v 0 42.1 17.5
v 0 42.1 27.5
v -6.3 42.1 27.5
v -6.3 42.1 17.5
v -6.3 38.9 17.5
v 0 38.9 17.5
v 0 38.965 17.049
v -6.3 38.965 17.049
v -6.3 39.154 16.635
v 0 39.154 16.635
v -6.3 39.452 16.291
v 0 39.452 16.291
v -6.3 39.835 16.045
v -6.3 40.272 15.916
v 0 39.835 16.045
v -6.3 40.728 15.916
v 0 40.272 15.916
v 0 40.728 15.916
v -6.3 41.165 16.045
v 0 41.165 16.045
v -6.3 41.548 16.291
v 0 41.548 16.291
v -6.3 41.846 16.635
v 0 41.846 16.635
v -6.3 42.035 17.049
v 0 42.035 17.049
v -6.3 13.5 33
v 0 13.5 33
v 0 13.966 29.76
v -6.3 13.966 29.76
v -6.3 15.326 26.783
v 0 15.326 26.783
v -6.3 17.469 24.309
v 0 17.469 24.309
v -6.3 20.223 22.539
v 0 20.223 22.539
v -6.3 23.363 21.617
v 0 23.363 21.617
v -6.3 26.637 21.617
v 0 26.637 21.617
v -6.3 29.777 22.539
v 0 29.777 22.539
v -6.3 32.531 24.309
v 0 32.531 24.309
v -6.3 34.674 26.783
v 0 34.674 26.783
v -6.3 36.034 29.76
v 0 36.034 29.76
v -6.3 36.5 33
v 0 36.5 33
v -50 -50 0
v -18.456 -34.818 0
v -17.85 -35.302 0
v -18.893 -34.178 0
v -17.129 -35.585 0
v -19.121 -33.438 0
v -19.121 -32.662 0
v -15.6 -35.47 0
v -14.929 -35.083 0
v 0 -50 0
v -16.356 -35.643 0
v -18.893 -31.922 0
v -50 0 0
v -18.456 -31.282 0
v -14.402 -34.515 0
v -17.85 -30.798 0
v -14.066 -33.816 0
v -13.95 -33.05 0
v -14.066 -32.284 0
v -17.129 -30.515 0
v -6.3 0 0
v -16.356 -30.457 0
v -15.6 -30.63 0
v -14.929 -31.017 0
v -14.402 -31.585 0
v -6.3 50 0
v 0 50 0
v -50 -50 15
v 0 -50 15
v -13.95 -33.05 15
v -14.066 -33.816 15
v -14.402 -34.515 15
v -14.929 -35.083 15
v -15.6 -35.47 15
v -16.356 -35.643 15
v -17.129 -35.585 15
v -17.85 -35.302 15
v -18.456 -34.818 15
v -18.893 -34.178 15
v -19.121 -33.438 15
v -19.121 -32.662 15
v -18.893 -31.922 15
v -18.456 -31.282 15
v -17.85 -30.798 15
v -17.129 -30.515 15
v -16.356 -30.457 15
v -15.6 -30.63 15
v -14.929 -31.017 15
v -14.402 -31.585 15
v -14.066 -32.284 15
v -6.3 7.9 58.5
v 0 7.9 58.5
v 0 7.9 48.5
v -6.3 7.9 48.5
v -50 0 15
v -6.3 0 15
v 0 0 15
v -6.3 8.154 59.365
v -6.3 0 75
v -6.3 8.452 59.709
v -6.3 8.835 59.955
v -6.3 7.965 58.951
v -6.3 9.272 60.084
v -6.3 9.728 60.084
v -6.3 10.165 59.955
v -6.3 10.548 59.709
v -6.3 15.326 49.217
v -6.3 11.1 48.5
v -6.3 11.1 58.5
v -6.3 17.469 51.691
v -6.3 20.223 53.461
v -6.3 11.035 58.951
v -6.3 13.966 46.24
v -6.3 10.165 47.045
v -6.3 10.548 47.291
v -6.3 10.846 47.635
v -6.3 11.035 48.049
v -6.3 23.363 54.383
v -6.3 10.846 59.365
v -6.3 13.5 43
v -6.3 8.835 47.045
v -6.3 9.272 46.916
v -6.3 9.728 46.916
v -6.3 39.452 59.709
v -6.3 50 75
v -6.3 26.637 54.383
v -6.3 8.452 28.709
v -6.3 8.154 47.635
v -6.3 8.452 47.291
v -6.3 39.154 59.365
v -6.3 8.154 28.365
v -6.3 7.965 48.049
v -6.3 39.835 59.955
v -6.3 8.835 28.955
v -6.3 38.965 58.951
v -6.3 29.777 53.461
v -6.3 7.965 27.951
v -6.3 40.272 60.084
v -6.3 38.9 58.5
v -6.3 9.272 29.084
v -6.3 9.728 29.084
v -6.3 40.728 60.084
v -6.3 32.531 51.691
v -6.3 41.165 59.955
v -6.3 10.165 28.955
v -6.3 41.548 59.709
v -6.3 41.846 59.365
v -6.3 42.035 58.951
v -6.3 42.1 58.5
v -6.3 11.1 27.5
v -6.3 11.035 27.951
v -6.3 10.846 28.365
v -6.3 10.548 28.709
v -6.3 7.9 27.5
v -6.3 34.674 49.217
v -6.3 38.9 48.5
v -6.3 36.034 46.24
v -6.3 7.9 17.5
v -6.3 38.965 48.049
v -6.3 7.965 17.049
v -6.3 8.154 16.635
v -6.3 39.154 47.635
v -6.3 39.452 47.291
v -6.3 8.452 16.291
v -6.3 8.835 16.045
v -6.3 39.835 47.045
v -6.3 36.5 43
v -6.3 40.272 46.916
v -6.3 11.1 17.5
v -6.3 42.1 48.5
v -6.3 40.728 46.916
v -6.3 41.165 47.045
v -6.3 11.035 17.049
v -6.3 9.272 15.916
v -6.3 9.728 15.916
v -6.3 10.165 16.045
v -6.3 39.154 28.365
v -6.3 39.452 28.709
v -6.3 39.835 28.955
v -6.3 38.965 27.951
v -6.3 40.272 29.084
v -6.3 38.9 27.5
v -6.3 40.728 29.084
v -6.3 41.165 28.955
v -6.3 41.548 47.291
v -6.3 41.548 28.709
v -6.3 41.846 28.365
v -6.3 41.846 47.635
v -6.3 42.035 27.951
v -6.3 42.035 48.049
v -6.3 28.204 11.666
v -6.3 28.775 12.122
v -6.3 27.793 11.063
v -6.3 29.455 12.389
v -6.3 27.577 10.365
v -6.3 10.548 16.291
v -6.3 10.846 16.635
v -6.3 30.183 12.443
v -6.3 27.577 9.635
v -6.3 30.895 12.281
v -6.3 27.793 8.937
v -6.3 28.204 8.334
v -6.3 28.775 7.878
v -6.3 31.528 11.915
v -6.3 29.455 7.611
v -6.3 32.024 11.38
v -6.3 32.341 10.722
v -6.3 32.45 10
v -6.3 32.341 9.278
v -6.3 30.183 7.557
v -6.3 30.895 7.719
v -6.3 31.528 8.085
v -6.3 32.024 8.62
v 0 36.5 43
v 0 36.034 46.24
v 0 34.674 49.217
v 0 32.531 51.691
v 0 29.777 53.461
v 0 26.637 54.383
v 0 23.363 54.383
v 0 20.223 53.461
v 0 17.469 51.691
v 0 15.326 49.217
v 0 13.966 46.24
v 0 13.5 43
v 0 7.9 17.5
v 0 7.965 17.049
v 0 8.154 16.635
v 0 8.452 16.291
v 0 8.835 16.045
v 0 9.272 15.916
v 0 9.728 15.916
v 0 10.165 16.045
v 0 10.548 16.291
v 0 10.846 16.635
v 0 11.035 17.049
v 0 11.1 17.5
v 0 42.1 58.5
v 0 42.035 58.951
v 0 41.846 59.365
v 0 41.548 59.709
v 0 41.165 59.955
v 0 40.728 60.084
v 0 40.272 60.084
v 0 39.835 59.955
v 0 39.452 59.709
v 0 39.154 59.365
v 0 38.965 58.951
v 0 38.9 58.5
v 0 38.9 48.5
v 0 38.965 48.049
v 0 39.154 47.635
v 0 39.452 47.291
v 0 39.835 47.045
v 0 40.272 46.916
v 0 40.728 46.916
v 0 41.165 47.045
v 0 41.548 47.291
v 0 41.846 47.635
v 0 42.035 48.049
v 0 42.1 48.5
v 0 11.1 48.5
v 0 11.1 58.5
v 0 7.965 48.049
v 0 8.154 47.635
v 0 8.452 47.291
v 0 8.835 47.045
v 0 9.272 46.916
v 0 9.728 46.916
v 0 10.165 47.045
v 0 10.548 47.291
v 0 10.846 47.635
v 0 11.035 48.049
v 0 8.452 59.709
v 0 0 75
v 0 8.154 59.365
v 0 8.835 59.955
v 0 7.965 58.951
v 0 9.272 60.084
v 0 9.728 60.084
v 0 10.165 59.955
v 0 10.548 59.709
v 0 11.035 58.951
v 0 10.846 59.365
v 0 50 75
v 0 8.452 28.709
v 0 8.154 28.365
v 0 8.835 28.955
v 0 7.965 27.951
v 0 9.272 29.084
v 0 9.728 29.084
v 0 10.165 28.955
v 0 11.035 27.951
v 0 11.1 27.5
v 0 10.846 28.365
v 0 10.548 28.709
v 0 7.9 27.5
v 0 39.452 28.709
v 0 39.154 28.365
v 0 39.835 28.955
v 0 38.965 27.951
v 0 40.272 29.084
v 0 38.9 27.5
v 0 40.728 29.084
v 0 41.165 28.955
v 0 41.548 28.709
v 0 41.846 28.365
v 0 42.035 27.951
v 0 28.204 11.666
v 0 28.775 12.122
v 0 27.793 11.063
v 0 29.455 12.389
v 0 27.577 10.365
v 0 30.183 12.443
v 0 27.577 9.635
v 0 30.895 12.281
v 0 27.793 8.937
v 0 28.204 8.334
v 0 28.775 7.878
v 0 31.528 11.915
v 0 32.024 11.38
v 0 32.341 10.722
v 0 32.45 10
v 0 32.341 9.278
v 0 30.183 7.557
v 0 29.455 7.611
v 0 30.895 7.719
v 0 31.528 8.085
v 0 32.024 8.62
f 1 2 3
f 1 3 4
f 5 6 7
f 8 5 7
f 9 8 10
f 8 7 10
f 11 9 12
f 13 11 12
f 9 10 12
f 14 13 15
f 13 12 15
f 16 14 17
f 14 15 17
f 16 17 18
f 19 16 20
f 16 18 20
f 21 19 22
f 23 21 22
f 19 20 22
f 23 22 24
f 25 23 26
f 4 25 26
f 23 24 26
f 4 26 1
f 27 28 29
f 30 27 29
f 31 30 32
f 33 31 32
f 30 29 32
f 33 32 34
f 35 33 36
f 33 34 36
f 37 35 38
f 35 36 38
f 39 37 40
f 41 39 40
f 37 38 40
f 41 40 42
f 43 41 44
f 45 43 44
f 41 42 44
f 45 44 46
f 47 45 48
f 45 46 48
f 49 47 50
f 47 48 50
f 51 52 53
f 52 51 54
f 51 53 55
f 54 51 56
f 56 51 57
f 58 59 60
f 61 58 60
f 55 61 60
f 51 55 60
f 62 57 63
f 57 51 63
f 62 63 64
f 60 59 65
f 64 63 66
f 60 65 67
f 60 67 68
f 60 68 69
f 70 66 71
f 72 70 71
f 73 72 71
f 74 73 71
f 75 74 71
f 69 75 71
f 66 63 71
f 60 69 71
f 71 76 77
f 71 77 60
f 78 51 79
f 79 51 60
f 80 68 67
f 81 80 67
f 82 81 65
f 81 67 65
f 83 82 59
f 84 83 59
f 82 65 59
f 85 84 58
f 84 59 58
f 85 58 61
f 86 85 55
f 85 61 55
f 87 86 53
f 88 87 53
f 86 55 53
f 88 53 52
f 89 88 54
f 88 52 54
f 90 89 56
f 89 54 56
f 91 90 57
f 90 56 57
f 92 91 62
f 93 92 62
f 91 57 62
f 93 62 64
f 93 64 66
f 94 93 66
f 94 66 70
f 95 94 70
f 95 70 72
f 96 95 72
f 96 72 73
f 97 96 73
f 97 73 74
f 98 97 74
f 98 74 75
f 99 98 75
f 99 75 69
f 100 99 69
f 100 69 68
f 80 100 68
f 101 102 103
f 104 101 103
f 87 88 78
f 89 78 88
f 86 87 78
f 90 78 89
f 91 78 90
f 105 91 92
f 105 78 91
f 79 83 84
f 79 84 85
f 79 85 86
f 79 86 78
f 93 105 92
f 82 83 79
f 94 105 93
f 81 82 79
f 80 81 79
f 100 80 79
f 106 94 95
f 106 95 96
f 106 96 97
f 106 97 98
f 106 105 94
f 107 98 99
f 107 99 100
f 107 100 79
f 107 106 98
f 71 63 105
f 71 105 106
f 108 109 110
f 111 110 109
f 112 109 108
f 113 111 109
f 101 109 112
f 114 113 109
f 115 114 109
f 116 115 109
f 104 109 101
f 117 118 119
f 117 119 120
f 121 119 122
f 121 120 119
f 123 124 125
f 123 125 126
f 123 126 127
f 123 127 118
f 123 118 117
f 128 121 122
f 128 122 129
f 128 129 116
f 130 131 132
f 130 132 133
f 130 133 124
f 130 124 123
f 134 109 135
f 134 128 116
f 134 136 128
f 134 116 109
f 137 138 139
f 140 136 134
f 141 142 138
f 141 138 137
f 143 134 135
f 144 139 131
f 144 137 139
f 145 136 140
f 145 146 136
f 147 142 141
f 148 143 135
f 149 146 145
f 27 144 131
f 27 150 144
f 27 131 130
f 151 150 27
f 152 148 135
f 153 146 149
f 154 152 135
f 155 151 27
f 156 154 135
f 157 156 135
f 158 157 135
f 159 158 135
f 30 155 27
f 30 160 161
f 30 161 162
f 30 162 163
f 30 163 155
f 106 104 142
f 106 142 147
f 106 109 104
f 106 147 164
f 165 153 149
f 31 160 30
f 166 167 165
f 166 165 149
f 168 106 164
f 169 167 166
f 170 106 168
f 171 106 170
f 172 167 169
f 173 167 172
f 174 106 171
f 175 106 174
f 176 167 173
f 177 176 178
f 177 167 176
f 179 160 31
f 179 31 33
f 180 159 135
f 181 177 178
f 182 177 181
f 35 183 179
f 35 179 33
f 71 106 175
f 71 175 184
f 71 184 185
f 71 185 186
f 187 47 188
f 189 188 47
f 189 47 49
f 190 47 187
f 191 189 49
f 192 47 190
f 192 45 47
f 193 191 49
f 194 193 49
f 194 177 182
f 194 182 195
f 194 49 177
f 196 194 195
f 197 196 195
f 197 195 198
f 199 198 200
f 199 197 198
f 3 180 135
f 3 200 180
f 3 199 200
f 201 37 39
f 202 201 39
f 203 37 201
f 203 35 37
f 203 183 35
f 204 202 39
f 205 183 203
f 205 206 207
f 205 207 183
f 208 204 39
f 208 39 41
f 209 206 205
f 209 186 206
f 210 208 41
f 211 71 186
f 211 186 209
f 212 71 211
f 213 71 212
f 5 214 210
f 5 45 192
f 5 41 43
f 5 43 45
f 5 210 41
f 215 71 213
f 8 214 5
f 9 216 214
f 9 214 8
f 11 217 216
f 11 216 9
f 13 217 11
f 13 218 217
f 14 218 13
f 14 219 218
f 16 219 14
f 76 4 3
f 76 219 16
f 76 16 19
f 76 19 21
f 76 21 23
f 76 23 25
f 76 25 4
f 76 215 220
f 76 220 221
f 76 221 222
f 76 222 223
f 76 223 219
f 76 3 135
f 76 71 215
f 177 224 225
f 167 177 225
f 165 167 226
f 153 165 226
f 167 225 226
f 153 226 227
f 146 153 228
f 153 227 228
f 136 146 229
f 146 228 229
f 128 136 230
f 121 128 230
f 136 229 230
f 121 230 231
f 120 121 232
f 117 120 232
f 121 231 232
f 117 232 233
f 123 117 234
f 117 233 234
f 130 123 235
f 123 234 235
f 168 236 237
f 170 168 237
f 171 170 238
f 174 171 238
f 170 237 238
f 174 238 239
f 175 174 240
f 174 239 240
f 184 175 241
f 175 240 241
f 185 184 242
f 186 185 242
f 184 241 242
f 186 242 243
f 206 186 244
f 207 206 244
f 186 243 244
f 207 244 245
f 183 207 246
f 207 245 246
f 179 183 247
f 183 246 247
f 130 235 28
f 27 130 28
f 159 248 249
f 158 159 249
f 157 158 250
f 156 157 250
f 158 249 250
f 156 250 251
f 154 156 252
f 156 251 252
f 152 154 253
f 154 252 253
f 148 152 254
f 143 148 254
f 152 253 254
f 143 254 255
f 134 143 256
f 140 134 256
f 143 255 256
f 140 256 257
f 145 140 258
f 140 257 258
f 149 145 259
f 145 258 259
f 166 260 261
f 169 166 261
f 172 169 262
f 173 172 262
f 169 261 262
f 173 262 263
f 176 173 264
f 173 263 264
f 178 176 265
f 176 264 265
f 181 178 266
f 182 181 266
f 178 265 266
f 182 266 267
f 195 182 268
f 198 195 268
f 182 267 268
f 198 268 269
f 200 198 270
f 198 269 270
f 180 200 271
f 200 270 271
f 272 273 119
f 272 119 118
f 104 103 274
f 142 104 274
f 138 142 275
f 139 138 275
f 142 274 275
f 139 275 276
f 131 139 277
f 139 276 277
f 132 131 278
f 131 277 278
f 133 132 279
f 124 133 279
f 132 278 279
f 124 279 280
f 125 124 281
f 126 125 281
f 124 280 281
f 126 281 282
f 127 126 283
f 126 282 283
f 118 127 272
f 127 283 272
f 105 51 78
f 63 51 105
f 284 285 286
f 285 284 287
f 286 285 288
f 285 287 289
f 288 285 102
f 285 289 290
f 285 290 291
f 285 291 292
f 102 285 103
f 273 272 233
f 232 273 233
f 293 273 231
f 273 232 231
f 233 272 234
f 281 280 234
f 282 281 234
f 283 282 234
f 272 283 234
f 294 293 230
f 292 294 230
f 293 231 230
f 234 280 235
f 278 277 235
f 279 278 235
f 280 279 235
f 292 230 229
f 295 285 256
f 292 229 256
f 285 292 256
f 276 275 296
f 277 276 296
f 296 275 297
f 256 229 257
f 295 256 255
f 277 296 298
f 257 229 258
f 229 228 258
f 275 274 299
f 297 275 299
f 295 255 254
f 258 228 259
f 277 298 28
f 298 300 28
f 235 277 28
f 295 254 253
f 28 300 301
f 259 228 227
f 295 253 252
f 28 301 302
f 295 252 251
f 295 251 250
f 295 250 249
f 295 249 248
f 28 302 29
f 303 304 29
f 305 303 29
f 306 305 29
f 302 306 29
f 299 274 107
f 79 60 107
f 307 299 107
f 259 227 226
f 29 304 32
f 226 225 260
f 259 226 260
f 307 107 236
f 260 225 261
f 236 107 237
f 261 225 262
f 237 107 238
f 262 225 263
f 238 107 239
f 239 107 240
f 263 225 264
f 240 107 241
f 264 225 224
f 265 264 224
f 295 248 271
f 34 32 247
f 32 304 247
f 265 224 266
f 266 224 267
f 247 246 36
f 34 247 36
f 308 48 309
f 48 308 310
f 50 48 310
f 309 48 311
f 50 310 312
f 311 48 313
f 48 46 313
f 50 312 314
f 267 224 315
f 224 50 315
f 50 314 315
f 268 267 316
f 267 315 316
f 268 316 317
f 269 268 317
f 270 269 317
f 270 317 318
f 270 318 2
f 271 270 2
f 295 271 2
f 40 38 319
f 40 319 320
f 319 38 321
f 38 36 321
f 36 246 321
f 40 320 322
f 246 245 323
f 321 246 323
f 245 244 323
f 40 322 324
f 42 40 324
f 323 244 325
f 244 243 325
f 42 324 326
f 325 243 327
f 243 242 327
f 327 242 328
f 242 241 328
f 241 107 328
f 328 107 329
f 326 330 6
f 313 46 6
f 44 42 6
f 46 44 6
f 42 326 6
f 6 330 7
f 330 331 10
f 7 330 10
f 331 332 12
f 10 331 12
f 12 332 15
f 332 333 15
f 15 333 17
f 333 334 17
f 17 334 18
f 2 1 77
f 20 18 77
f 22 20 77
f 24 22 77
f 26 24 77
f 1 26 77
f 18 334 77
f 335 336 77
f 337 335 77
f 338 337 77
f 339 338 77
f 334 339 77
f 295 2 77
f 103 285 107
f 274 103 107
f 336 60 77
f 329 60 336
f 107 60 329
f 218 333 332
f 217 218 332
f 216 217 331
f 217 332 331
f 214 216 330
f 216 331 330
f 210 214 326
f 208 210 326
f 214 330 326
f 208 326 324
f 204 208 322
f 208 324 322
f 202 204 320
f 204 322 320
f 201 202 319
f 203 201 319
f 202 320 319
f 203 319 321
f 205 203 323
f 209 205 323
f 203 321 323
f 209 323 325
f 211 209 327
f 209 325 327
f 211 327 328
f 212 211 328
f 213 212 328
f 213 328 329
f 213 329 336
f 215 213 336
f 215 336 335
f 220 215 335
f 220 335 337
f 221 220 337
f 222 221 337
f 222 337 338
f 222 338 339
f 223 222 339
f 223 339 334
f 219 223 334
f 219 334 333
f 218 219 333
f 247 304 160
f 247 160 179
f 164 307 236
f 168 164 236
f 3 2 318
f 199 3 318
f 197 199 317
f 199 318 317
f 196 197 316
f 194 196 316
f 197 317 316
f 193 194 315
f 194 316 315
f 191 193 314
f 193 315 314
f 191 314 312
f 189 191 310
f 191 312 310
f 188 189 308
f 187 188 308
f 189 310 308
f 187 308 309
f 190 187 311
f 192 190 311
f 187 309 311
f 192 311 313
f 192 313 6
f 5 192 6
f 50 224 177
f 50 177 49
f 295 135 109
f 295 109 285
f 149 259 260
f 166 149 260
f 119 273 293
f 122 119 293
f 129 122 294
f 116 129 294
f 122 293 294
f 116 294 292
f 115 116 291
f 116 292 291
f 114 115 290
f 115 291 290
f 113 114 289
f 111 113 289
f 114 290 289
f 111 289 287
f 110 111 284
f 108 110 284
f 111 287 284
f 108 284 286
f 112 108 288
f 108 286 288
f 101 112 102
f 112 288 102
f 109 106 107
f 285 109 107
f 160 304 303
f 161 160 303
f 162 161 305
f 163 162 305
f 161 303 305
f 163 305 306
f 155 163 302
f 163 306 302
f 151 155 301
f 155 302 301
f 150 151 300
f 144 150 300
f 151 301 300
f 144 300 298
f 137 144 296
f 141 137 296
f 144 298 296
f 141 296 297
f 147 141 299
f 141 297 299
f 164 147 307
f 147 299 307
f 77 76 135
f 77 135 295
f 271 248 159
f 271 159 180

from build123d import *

# Parameters (mm, degrees)
SKETCH_W        = 50
SKETCH_H        = 50
PAD_DEPTH       = 15
SKETCH001_W     = 6.3
SKETCH001_H     = 50
PAD001_DEPTH    = 75
SKETCH002_R     = 2.45
POCKET_DEPTH    = 13
SKETCH004_R     = 2.6
POCKET001_DEPTH = 85.001


with BuildPart() as part:
    # Sketch → Pad (new body)
    with BuildSketch(Plane.XY):
        with Locations((-25, -25)):
            Rectangle(SKETCH_W, SKETCH_H)
    extrude(amount=PAD_DEPTH)

    # Sketch001 → Pad001 (join)
    with BuildSketch(Plane.XY):
        with Locations((-3.15, 25)):
            Rectangle(SKETCH001_W, SKETCH001_H)
    extrude(amount=PAD001_DEPTH)

    # Sketch002 (on Face12 of Pad001) → Pocket (cut)
    with BuildSketch(Plane.YZ):
        with Locations((30, 10)):
            Circle(SKETCH002_R)
        with BuildLine():
            ThreePointArc((42.1, 58.5), (40.5, 60.1), (38.9, 58.5))
            Line((38.9, 58.5), (38.9, 48.5))
            ThreePointArc((38.9, 48.5), (40.5, 46.9), (42.1, 48.5))
            Line((42.1, 58.5), (42.1, 48.5))
        make_face()
        with BuildLine():
            ThreePointArc((42.1, 27.5), (40.5, 29.1), (38.9, 27.5))
            Line((38.9, 27.5), (38.9, 17.5))
            ThreePointArc((38.9, 17.5), (40.5, 15.9), (42.1, 17.5))
            Line((42.1, 27.5), (42.1, 17.5))
        make_face()
        with BuildLine():
            ThreePointArc((11.1, 58.5), (9.5, 60.1), (7.9, 58.5))
            Line((7.9, 58.5), (7.9, 48.5))
            ThreePointArc((7.9, 48.5), (9.5, 46.9), (11.1, 48.5))
            Line((11.1, 58.5), (11.1, 48.5))
        make_face()
        with BuildLine():
            ThreePointArc((11.1, 27.5), (9.5, 29.1), (7.9, 27.5))
            Line((7.9, 27.5), (7.9, 17.5))
            ThreePointArc((7.9, 17.5), (9.5, 15.9), (11.1, 17.5))
            Line((11.1, 27.5), (11.1, 17.5))
        make_face()
        with BuildLine():
            ThreePointArc((36.5, 43), (25, 54.5), (13.5, 43))
            Line((13.5, 43), (13.5, 33))
            ThreePointArc((13.5, 33), (25, 21.5), (36.5, 33))
            Line((36.5, 43), (36.5, 33))
        make_face()
    extrude(amount=-POCKET_DEPTH, mode=Mode.SUBTRACT)

    # Sketch004 → Pocket001 (cut, through all)
    with BuildSketch(Plane(origin=(0, 0, -10), x_dir=(1, 0, 0), z_dir=(0, 0, -1))):
        with Locations((-16.55, 33.05)):
            Circle(SKETCH004_R)
    extrude(amount=-POCKET001_DEPTH, mode=Mode.SUBTRACT)


solid = part.part
